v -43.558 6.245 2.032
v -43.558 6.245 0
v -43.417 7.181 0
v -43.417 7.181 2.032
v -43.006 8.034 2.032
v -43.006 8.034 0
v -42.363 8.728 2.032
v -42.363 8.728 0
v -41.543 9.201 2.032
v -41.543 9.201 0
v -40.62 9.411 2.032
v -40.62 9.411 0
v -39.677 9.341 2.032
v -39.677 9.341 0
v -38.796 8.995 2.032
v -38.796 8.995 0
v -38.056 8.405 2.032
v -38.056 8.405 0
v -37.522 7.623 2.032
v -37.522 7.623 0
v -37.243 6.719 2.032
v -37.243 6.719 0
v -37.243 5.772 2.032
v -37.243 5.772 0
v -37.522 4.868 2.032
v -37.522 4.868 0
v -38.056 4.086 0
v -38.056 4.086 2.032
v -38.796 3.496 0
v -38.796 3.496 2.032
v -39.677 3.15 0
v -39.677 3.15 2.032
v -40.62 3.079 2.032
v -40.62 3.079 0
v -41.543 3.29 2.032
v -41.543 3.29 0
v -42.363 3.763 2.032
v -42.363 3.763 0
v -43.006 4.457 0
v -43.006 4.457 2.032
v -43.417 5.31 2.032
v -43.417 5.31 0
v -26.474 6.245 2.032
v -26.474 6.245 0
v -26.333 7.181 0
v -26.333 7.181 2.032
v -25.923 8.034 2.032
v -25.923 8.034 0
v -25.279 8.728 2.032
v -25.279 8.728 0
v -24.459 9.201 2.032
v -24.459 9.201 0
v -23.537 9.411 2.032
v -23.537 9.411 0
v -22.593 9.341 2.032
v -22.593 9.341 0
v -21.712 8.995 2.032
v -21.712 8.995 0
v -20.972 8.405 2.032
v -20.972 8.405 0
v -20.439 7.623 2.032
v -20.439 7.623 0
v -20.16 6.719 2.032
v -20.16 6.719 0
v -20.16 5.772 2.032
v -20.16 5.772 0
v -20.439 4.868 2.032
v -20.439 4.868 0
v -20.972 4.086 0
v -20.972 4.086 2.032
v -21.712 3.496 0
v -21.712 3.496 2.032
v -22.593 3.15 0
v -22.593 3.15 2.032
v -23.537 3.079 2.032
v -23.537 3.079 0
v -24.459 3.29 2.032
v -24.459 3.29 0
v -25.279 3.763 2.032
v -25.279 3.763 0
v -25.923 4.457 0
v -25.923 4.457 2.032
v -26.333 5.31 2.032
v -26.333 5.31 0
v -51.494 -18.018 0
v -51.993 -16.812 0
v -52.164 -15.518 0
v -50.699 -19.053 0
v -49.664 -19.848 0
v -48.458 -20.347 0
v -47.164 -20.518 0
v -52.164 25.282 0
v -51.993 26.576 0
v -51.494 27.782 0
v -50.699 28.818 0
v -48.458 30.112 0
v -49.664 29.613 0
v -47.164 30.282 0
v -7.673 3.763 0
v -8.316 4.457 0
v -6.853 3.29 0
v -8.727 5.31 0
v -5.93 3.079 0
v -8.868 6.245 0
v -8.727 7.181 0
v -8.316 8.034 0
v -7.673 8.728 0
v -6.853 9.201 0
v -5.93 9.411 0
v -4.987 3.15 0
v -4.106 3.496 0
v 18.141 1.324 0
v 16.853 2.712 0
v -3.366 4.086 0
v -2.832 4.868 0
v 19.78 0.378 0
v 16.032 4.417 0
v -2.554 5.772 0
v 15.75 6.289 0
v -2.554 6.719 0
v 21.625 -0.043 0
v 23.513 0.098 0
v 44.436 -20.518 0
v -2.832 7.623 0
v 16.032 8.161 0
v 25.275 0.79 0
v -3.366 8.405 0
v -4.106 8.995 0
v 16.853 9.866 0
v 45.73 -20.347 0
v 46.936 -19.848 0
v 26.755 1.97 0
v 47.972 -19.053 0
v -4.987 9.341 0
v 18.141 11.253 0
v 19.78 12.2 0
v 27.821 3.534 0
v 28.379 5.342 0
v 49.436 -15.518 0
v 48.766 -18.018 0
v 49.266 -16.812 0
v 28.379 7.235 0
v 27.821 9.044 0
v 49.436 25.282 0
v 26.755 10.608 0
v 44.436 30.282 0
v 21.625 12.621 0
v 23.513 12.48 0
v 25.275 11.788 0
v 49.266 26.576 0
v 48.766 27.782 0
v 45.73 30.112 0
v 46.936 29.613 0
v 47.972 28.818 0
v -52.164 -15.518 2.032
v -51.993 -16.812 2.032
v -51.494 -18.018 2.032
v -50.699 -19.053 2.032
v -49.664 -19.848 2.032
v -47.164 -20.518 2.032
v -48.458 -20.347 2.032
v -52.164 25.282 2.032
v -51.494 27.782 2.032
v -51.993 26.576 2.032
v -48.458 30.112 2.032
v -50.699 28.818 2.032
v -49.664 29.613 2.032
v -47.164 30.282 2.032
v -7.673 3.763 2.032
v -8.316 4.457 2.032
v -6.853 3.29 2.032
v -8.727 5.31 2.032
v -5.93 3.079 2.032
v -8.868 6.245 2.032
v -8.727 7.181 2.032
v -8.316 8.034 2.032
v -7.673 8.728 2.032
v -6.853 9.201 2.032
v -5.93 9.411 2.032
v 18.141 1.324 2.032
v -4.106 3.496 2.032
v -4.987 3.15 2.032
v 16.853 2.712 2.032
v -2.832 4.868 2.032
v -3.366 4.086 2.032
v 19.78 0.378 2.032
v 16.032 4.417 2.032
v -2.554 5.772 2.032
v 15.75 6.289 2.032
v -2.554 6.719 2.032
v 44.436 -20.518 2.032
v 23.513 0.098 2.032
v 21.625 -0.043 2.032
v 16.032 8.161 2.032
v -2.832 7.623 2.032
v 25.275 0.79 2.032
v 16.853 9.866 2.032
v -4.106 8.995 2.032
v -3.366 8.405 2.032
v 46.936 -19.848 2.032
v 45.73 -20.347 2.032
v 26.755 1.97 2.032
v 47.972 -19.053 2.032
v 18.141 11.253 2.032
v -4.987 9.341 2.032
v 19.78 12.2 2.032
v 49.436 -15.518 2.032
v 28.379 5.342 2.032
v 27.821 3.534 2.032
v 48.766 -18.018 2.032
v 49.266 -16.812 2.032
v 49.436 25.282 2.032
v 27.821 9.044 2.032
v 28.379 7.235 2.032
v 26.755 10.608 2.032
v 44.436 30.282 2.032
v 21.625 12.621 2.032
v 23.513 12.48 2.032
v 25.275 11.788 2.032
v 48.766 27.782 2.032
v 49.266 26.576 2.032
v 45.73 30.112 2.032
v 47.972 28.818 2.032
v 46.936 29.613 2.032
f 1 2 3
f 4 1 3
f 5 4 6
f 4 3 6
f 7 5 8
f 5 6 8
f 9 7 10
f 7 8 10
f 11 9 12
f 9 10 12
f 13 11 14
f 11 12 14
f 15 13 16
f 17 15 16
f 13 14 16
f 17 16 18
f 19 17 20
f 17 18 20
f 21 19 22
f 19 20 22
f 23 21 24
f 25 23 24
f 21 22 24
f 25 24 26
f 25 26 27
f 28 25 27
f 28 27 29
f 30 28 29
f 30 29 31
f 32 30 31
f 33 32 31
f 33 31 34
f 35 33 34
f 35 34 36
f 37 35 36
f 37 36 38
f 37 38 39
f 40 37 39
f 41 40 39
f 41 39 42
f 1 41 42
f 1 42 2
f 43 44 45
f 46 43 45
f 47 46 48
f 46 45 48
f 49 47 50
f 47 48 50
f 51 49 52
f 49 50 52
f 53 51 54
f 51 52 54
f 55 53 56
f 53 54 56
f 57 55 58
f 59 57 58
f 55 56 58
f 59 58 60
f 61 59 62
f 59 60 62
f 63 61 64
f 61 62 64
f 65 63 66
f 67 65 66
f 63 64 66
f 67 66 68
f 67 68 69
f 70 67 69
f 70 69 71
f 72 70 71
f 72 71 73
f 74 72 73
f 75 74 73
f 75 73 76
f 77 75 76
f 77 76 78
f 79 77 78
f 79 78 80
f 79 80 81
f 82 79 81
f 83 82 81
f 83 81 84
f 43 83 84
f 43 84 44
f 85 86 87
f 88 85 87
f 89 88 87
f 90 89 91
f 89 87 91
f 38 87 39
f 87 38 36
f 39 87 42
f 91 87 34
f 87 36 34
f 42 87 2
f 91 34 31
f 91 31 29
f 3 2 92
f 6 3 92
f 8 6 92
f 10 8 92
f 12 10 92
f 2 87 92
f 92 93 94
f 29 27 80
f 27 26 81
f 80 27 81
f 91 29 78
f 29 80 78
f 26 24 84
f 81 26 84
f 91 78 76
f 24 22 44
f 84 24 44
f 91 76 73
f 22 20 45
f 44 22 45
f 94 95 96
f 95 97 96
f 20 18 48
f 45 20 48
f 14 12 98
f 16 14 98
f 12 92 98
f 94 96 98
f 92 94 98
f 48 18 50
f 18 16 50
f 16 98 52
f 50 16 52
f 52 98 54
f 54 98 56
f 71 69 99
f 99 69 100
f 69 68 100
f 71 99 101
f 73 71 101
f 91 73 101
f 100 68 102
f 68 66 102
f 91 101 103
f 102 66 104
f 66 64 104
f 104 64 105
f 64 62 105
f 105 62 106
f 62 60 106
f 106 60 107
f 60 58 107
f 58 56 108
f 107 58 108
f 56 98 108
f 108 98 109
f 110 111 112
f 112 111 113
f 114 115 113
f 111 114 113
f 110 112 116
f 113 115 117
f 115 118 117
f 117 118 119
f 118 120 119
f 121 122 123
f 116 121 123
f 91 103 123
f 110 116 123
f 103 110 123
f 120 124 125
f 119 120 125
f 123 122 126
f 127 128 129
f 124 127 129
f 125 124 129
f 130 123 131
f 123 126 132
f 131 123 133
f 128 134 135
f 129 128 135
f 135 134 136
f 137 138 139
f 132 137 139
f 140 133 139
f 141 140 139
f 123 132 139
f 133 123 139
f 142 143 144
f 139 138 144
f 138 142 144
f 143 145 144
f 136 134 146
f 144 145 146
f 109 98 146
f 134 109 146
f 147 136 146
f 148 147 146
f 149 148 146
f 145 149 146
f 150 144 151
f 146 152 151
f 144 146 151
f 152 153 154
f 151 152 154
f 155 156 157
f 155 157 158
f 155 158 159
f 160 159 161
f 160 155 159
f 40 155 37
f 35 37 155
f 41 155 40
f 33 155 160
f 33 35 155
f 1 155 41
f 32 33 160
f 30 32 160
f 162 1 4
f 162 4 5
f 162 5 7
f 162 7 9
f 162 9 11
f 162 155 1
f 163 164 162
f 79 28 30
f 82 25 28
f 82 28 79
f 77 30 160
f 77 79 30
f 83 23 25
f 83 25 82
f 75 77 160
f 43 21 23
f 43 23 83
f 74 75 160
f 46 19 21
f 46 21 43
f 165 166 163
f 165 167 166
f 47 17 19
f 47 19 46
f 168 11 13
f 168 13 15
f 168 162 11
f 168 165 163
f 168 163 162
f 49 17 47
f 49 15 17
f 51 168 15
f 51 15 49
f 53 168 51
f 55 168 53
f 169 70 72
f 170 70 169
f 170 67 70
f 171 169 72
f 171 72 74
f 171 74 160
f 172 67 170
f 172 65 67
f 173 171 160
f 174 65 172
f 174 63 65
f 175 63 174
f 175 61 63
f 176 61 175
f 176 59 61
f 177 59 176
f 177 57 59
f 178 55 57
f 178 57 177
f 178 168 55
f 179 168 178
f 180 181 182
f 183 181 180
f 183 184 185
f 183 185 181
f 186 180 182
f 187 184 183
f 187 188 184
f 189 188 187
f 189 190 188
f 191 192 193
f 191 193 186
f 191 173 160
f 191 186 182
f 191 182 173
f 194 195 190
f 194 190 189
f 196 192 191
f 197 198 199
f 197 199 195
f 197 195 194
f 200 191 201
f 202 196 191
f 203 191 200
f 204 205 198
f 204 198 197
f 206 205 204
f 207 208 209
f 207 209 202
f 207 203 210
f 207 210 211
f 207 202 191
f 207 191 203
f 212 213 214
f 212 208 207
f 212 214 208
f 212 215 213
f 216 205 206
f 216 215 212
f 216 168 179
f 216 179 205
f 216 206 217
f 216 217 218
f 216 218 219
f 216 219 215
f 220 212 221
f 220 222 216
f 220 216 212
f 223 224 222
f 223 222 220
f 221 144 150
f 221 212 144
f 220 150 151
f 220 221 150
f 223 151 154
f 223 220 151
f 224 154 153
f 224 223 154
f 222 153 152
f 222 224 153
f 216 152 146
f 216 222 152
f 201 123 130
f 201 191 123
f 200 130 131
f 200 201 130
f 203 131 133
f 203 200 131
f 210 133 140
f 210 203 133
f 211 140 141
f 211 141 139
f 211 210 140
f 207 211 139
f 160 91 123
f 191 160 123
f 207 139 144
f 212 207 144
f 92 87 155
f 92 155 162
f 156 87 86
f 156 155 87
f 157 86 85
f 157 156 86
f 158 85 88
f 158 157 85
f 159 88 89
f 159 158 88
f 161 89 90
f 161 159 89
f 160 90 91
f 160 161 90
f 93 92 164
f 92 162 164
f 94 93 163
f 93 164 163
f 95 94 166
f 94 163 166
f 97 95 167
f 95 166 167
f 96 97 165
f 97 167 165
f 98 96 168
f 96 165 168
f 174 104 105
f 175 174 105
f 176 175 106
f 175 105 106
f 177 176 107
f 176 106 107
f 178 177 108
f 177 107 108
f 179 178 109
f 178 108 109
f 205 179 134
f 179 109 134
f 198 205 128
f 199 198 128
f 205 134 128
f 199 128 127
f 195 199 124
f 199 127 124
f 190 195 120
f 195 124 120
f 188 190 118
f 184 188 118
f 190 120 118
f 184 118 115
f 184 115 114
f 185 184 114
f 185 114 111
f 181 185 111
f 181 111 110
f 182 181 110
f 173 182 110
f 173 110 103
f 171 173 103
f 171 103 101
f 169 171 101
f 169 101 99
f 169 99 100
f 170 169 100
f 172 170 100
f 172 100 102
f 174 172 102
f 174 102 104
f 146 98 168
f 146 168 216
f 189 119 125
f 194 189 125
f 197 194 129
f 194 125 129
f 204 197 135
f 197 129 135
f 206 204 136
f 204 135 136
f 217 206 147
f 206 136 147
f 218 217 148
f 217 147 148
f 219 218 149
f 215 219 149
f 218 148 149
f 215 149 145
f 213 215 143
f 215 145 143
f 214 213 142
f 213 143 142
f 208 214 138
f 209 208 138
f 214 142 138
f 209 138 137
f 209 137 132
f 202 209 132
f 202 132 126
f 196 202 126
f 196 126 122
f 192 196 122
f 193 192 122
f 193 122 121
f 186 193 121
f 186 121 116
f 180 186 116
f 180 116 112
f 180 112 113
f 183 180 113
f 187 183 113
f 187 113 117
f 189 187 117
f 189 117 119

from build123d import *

# Parameters (mm, degrees)
F0_W     = 101.6
F0_H     = 50.8
F1_DEPTH = 2.032
F2_R     = 5
F4_D     = 6.35
F6_D     = 12.7


with BuildPart() as f1:
    # F0 (on Top) → F1 (new body)
    with BuildSketch(Plane.XY):
        with Locations((-1.363633, 4.882393)):
            Rectangle(F0_W, F0_H)
    extrude(amount=F1_DEPTH)

    # F2
    f2_edges = [f1.edges().sort_by_distance(p)[0] for p in [
        (-52.163633, 30.282393, 1.016),
        (49.436367, 30.282393, 1.016),
        (-52.163633, -20.517607, 1.016),
        (49.436367, -20.517607, 1.016),
    ]]
    fillet(f2_edges, radius=F2_R)

    # F4 (through all)
    with Locations(Plane.XY.offset(2.032)):
        with Locations((-40.383019, 6.245364), (-23.299415, 6.245364), (-5.693044, 6.245364)):
            Hole(F4_D / 2)

    # F6 (through all)
    with Locations(Plane.XY.offset(2.032)):
        with Locations((22.099847, 6.288829)):
            Hole(F6_D / 2)


solid = f1.part
